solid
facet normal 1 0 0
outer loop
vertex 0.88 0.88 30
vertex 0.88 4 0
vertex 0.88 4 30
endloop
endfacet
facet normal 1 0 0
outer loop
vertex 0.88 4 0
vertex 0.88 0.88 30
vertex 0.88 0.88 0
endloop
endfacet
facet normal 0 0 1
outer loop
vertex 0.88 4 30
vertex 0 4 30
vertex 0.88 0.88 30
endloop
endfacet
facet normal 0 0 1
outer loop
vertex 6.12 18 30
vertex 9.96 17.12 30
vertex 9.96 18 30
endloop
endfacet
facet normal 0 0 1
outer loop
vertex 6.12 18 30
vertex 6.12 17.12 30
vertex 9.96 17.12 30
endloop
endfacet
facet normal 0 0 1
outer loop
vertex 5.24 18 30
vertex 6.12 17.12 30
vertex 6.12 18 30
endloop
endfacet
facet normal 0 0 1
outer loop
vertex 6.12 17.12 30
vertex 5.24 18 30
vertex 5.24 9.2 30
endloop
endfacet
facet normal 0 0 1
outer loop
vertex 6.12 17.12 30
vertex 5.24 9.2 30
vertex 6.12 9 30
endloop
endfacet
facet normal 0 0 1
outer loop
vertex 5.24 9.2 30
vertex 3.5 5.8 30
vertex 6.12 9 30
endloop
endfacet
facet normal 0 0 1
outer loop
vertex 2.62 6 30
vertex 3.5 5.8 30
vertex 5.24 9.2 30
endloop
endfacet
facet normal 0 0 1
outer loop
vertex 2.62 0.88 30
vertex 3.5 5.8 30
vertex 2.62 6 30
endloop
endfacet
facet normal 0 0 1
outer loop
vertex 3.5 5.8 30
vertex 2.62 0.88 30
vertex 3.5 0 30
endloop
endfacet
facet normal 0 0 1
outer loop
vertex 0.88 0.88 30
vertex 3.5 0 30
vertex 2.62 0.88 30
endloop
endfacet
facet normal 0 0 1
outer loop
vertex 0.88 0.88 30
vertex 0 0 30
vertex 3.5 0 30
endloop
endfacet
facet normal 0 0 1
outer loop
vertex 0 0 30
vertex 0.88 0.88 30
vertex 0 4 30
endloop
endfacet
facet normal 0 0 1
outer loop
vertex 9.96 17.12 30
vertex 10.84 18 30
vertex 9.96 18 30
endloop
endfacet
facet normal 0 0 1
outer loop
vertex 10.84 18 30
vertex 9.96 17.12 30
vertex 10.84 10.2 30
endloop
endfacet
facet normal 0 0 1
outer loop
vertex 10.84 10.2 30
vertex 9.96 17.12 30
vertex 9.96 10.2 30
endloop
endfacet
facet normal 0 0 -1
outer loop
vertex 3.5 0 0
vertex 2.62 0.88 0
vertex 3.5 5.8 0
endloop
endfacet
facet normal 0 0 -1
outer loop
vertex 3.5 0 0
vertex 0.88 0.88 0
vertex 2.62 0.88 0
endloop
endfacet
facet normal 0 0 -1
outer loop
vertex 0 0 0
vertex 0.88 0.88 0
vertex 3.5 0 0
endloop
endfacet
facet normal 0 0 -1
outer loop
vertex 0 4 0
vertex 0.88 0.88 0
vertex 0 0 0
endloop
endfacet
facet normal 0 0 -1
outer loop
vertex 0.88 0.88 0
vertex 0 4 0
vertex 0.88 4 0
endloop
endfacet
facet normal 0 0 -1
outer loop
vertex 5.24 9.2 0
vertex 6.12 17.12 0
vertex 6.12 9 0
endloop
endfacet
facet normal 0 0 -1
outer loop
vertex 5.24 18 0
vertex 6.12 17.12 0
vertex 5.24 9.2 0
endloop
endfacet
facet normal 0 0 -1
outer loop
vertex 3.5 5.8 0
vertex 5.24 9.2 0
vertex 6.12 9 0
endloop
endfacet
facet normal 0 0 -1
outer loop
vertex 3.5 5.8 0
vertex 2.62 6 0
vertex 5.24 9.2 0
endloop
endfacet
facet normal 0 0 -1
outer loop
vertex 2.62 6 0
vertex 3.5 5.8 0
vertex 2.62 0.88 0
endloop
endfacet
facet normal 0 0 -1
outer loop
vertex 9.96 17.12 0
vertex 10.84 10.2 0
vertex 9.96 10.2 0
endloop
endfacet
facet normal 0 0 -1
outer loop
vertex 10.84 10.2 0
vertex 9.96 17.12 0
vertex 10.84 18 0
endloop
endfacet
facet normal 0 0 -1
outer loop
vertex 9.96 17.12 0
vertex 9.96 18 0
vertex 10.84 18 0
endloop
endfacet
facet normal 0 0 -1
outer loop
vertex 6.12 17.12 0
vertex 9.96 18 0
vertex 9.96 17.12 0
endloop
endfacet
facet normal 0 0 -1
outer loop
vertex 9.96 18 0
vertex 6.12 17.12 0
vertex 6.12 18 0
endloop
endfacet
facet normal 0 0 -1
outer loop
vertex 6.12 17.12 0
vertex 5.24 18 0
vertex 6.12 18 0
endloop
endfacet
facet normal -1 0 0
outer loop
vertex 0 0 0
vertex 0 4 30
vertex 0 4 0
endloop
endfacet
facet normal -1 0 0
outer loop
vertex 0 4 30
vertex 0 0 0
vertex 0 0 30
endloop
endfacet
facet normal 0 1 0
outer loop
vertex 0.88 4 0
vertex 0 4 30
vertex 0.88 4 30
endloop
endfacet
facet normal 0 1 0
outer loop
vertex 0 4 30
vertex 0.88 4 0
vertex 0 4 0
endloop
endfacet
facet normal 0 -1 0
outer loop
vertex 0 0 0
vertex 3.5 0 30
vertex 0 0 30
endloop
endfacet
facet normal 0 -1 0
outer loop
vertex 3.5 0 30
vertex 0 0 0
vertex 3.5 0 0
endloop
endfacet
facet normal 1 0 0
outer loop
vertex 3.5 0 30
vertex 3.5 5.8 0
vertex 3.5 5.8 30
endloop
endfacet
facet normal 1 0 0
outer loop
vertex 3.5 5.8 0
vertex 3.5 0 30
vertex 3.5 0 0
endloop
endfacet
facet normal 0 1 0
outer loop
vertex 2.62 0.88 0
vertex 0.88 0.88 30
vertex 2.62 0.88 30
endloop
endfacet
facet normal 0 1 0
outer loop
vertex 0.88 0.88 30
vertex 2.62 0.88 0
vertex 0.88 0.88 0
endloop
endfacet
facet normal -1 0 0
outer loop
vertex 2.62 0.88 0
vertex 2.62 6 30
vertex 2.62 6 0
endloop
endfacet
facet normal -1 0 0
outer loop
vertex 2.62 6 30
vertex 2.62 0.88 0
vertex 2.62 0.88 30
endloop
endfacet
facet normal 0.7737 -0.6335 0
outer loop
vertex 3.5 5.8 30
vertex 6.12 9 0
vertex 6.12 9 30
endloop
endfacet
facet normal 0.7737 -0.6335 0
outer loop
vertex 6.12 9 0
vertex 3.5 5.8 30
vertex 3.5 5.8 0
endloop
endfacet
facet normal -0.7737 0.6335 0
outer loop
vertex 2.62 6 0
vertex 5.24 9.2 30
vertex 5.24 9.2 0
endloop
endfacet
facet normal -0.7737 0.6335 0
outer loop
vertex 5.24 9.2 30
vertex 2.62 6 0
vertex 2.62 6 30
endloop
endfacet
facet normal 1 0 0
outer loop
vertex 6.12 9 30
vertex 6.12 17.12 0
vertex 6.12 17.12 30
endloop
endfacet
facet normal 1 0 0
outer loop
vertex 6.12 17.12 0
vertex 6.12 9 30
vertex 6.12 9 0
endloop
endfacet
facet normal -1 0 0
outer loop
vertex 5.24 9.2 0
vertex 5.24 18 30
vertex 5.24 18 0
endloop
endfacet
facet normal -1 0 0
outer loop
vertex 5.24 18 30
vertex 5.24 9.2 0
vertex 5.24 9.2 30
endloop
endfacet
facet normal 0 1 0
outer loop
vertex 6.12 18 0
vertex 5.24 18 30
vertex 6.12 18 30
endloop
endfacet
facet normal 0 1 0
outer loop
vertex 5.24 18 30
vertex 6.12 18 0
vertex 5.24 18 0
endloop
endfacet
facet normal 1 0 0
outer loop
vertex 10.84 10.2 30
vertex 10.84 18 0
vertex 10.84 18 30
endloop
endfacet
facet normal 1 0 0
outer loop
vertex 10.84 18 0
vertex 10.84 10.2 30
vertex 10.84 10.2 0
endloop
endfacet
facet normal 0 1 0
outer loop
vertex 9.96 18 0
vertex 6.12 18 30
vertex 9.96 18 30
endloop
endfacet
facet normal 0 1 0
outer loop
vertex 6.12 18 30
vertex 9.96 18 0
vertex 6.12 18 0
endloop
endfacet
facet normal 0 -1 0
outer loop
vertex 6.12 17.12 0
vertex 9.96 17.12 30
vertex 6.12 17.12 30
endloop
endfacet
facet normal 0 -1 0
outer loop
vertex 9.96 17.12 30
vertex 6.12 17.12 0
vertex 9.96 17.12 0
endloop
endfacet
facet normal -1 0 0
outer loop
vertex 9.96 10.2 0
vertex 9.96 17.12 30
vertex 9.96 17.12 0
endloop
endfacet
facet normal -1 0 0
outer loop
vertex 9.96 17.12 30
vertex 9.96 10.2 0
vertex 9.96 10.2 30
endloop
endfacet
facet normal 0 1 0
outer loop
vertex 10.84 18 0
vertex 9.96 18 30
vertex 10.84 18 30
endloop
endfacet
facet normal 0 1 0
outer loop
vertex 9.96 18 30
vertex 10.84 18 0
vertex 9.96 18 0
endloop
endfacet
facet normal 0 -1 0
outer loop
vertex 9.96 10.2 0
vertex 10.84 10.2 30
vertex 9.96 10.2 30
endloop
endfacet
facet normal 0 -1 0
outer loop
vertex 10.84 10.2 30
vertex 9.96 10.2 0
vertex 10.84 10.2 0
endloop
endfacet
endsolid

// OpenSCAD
/*
 * Vitavia Target Greenhouse Panes Holder 1301
 *
 * Author: Pavel Rampas
 * Version: 1.0.0 (Changelog is at the bottom)
 * License: CC BY-SA 4.0 [https://creativecommons.org/licenses/by-sa/4.0/]
 * Link: https://github.com/pavelrampas/openscad-models
 *
 * OpenSCAD version: 2021.01
 *
 * Instructions:
 * Set up parameters, render and print.
 *
 * Height is layer.
 * Thickness is perimeter.
 */

// Parameters
//------------------------------------------------------------------------------

$fn = $preview ? 15 : 90;

thickness = 0.88;
height = 30;

sizeA = 4.0;
sizeB = 3.5;
sizeC = 6;
sizeDX = 3.5;
sizeDY = 3;
sizeE = 9;
sizeF = 5.6;
sizeG = 7.8;

// Code
//------------------------------------------------------------------------------

cube([thickness, sizeA, height]);

cube([sizeB, thickness, height]);

translate([sizeB - thickness, 0, 0]) {
    cube([thickness, sizeC, height]);
}

compensation = 0.2;
cubePoints = [
  [sizeB - thickness, sizeC, 0],
  [sizeB, sizeC - compensation, 0],
  [(sizeB + sizeDX) - thickness, sizeC + sizeDY, 0],
  [(sizeB + sizeDX) - (2 * thickness), sizeC + sizeDY + compensation, 0],
  [sizeB - thickness, sizeC, height],
  [sizeB, sizeC - compensation, height],
  [(sizeB + sizeDX) - thickness, sizeC + sizeDY, height],
  [(sizeB + sizeDX) - (2 * thickness), sizeC + sizeDY + compensation, height]
];
cubeFaces = [
  [0,1,2,3],
  [4,5,1,0],
  [7,6,5,4],
  [5,6,2,1],
  [6,7,3,2],
  [7,4,0,3]
];
polyhedron( cubePoints, cubeFaces );

translate([(sizeB + sizeDX) - (2 * thickness), sizeC + sizeDY, 0]) {
    cube([thickness, sizeE, height]);
}

translate([
    (sizeB + sizeDX) - (2 * thickness),
    (sizeC + sizeE) - thickness + sizeDY,
    0
]) {
    cube([sizeF, thickness, height]);
}

translate([
    (sizeB + sizeDX + sizeF) - (3 * thickness),
    (sizeC + (sizeE - sizeG)) + sizeDY,
    0
]) {
    cube([thickness, sizeG, height]);
}

// Functions
//------------------------------------------------------------------------------

// Modules
//------------------------------------------------------------------------------

// Changelog
//------------------------------------------------------------------------------

// [1.0.0]:
// Initial release.
